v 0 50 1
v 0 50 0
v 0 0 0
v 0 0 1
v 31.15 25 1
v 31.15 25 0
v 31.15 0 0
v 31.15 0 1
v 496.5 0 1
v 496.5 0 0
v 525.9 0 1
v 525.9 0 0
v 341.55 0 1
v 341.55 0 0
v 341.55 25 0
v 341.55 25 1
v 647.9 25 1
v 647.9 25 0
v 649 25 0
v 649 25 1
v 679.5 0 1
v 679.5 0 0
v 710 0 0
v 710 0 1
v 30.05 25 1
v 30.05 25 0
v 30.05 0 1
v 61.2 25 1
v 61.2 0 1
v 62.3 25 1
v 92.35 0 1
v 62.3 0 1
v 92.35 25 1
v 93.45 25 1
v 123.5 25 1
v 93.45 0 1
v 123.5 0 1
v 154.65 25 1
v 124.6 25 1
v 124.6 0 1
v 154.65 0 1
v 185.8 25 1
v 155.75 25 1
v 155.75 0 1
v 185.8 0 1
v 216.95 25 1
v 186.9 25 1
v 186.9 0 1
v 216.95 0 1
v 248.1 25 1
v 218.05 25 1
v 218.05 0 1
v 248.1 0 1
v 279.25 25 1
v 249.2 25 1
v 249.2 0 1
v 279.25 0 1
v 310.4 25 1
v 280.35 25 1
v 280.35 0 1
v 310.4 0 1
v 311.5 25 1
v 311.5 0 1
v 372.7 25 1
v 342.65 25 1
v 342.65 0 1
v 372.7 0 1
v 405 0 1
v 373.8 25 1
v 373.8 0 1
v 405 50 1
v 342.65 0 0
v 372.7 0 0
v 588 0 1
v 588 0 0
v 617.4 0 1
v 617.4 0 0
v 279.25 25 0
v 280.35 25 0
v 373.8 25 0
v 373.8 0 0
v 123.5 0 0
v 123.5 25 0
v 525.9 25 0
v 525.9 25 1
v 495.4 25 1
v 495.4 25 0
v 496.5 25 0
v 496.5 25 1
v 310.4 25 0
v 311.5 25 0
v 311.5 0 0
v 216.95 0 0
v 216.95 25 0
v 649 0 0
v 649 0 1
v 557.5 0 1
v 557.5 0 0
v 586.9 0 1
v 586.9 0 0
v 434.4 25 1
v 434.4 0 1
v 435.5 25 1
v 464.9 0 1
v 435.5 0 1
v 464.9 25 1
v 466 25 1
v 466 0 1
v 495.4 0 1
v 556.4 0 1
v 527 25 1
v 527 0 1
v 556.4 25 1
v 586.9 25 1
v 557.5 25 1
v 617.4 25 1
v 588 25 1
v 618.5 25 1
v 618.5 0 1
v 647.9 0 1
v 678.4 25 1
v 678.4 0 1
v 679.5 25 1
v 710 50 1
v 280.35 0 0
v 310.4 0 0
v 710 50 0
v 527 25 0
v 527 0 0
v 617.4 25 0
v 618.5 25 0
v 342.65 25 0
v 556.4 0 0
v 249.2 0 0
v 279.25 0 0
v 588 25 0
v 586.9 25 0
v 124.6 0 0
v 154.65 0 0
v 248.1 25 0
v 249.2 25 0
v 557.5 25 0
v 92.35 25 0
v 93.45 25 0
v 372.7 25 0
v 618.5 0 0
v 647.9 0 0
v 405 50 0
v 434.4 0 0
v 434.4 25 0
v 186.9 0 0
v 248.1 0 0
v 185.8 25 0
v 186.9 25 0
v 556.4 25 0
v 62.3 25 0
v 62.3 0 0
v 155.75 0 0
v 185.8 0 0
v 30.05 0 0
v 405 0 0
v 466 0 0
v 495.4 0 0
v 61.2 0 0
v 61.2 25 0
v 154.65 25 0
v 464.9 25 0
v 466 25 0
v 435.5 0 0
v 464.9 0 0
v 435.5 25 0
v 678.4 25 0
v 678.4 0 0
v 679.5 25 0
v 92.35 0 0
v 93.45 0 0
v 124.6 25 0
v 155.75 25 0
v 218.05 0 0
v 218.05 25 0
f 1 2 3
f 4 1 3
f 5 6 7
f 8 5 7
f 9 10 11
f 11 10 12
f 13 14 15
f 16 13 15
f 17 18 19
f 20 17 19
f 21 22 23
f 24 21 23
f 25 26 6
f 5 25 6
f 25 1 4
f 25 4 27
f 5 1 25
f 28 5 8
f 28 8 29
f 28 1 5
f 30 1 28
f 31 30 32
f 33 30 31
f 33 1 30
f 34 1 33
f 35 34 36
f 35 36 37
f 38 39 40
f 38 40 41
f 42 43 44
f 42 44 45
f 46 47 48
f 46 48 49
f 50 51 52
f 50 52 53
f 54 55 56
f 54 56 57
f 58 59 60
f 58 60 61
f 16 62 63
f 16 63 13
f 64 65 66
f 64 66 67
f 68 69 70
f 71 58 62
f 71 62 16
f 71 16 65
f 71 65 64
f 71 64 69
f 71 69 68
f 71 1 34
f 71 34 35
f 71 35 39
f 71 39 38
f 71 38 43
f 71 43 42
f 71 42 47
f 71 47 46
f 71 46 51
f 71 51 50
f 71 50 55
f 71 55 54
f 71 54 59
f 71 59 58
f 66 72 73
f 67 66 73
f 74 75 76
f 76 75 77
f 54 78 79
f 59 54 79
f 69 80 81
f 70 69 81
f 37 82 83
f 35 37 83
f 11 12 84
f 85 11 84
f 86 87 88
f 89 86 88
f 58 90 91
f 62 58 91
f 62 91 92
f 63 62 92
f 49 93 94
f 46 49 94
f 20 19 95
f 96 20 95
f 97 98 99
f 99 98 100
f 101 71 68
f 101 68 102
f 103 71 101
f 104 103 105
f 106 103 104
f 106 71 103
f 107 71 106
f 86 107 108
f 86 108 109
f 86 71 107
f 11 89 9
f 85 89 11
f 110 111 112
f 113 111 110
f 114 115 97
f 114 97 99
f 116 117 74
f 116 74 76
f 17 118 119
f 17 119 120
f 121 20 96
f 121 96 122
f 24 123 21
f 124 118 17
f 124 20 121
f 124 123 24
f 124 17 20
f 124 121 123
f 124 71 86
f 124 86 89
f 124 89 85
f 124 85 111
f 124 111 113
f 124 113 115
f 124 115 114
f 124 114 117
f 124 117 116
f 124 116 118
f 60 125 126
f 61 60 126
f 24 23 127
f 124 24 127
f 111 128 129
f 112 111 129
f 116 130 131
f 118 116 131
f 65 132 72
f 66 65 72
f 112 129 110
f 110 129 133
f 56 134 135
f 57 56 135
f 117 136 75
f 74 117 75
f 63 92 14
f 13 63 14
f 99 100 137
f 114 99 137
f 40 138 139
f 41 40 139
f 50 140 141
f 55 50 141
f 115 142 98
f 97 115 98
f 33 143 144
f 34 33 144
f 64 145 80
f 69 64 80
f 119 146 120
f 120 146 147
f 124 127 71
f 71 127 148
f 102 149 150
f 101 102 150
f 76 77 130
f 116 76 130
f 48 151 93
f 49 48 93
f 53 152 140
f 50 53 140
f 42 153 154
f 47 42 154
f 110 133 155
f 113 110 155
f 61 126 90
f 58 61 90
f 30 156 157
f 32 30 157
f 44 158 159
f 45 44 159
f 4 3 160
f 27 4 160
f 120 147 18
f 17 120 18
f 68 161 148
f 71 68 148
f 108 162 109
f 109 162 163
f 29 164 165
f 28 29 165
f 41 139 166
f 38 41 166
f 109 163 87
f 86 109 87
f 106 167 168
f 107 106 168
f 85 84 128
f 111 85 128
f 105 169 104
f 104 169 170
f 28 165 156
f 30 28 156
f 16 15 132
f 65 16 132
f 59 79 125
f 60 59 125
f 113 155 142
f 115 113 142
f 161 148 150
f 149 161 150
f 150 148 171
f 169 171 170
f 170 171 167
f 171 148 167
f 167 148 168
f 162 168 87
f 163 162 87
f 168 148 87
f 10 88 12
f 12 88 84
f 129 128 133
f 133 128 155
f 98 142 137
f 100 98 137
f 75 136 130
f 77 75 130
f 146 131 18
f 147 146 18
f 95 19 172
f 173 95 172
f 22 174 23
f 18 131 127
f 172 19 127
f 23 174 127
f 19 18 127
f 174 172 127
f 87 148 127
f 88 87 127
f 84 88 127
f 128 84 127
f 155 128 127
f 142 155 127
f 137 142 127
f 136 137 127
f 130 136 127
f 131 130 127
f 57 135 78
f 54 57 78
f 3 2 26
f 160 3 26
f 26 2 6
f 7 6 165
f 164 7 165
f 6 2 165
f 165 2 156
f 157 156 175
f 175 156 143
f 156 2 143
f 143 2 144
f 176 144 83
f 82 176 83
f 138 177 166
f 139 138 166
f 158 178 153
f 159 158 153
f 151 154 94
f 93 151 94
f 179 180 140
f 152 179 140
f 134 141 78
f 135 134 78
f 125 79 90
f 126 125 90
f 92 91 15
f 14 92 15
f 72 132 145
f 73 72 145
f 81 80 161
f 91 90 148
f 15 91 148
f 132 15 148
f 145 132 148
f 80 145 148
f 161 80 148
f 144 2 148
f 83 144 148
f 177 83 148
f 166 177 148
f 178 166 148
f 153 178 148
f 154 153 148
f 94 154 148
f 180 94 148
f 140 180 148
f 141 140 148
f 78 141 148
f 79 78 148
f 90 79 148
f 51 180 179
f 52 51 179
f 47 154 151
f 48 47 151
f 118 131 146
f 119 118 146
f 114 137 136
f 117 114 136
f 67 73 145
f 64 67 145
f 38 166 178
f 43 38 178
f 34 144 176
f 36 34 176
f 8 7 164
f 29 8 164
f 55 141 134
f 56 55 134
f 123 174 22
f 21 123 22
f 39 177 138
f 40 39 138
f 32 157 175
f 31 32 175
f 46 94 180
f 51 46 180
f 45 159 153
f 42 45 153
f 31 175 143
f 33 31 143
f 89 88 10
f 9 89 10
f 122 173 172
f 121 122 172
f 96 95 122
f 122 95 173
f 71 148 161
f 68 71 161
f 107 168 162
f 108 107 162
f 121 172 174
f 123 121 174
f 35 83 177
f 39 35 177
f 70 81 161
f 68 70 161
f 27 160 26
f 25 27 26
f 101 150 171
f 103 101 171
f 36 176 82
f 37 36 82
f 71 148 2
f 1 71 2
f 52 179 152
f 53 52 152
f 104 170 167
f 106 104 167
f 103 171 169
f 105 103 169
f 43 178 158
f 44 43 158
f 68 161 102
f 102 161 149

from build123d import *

# Parameters (mm, degrees)
F1_DEPTH = 1
F2_DEPTH = 1


with BuildPart() as f1:
    # F0 (on Top) → F1 (new body)
    with BuildSketch(Plane.XY):
        Polygon((405, 50), (0, 50), (0, 0), (30.05, 0), (30.05, 25), (31.15, 25), (31.15, 0), (61.2, 0), (61.2, 25), (62.3, 25), (62.3, 0), (92.35, 0), (92.35, 25), (93.45, 25), (93.45, 0), (123.5, 0), (123.5, 25), (124.6, 25), (124.6, 0), (154.65, 0), (154.65, 25), (155.75, 25), (155.75, 0), (185.8, 0), (185.8, 25), (186.9, 25), (186.9, 0), (216.95, 0), (216.95, 25), (218.05, 25), (218.05, 0), (248.1, 0), (248.1, 25), (249.2, 25), (249.2, 0), (279.25, 0), (279.25, 25), (280.35, 25), (280.35, 0), (310.4, 0), (310.4, 25), (311.5, 25), (311.5, 0), (341.55, 0), (341.55, 25), (342.65, 25), (342.65, 0), (372.7, 0), (372.7, 25), (373.8, 25), (373.8, 0), (405, 0), align=None)
    extrude(amount=F1_DEPTH)


with BuildPart() as f2:
    # F0 (on Top) → F2 (new body)
    with BuildSketch(Plane.XY):
        Polygon((710, 50), (405, 50), (405, 0), (434.4, 0), (434.4, 25), (435.5, 25), (435.5, 0), (464.9, 0), (464.9, 25), (466, 25), (466, 0), (495.4, 0), (495.4, 25), (496.5, 25), (496.5, 0), (525.9, 0), (525.9, 25), (527, 25), (527, 0), (556.4, 0), (556.4, 25), (557.5, 25), (557.5, 0), (586.9, 0), (586.9, 25), (588, 25), (588, 0), (617.4, 0), (617.4, 25), (618.5, 25), (618.5, 0), (647.9, 0), (647.9, 25), (649, 25), (649, 0), (678.4, 0), (678.4, 25), (679.5, 25), (679.5, 0), (710, 0), align=None)
    extrude(amount=F2_DEPTH)


solid = Compound([f1.part, f2.part])
